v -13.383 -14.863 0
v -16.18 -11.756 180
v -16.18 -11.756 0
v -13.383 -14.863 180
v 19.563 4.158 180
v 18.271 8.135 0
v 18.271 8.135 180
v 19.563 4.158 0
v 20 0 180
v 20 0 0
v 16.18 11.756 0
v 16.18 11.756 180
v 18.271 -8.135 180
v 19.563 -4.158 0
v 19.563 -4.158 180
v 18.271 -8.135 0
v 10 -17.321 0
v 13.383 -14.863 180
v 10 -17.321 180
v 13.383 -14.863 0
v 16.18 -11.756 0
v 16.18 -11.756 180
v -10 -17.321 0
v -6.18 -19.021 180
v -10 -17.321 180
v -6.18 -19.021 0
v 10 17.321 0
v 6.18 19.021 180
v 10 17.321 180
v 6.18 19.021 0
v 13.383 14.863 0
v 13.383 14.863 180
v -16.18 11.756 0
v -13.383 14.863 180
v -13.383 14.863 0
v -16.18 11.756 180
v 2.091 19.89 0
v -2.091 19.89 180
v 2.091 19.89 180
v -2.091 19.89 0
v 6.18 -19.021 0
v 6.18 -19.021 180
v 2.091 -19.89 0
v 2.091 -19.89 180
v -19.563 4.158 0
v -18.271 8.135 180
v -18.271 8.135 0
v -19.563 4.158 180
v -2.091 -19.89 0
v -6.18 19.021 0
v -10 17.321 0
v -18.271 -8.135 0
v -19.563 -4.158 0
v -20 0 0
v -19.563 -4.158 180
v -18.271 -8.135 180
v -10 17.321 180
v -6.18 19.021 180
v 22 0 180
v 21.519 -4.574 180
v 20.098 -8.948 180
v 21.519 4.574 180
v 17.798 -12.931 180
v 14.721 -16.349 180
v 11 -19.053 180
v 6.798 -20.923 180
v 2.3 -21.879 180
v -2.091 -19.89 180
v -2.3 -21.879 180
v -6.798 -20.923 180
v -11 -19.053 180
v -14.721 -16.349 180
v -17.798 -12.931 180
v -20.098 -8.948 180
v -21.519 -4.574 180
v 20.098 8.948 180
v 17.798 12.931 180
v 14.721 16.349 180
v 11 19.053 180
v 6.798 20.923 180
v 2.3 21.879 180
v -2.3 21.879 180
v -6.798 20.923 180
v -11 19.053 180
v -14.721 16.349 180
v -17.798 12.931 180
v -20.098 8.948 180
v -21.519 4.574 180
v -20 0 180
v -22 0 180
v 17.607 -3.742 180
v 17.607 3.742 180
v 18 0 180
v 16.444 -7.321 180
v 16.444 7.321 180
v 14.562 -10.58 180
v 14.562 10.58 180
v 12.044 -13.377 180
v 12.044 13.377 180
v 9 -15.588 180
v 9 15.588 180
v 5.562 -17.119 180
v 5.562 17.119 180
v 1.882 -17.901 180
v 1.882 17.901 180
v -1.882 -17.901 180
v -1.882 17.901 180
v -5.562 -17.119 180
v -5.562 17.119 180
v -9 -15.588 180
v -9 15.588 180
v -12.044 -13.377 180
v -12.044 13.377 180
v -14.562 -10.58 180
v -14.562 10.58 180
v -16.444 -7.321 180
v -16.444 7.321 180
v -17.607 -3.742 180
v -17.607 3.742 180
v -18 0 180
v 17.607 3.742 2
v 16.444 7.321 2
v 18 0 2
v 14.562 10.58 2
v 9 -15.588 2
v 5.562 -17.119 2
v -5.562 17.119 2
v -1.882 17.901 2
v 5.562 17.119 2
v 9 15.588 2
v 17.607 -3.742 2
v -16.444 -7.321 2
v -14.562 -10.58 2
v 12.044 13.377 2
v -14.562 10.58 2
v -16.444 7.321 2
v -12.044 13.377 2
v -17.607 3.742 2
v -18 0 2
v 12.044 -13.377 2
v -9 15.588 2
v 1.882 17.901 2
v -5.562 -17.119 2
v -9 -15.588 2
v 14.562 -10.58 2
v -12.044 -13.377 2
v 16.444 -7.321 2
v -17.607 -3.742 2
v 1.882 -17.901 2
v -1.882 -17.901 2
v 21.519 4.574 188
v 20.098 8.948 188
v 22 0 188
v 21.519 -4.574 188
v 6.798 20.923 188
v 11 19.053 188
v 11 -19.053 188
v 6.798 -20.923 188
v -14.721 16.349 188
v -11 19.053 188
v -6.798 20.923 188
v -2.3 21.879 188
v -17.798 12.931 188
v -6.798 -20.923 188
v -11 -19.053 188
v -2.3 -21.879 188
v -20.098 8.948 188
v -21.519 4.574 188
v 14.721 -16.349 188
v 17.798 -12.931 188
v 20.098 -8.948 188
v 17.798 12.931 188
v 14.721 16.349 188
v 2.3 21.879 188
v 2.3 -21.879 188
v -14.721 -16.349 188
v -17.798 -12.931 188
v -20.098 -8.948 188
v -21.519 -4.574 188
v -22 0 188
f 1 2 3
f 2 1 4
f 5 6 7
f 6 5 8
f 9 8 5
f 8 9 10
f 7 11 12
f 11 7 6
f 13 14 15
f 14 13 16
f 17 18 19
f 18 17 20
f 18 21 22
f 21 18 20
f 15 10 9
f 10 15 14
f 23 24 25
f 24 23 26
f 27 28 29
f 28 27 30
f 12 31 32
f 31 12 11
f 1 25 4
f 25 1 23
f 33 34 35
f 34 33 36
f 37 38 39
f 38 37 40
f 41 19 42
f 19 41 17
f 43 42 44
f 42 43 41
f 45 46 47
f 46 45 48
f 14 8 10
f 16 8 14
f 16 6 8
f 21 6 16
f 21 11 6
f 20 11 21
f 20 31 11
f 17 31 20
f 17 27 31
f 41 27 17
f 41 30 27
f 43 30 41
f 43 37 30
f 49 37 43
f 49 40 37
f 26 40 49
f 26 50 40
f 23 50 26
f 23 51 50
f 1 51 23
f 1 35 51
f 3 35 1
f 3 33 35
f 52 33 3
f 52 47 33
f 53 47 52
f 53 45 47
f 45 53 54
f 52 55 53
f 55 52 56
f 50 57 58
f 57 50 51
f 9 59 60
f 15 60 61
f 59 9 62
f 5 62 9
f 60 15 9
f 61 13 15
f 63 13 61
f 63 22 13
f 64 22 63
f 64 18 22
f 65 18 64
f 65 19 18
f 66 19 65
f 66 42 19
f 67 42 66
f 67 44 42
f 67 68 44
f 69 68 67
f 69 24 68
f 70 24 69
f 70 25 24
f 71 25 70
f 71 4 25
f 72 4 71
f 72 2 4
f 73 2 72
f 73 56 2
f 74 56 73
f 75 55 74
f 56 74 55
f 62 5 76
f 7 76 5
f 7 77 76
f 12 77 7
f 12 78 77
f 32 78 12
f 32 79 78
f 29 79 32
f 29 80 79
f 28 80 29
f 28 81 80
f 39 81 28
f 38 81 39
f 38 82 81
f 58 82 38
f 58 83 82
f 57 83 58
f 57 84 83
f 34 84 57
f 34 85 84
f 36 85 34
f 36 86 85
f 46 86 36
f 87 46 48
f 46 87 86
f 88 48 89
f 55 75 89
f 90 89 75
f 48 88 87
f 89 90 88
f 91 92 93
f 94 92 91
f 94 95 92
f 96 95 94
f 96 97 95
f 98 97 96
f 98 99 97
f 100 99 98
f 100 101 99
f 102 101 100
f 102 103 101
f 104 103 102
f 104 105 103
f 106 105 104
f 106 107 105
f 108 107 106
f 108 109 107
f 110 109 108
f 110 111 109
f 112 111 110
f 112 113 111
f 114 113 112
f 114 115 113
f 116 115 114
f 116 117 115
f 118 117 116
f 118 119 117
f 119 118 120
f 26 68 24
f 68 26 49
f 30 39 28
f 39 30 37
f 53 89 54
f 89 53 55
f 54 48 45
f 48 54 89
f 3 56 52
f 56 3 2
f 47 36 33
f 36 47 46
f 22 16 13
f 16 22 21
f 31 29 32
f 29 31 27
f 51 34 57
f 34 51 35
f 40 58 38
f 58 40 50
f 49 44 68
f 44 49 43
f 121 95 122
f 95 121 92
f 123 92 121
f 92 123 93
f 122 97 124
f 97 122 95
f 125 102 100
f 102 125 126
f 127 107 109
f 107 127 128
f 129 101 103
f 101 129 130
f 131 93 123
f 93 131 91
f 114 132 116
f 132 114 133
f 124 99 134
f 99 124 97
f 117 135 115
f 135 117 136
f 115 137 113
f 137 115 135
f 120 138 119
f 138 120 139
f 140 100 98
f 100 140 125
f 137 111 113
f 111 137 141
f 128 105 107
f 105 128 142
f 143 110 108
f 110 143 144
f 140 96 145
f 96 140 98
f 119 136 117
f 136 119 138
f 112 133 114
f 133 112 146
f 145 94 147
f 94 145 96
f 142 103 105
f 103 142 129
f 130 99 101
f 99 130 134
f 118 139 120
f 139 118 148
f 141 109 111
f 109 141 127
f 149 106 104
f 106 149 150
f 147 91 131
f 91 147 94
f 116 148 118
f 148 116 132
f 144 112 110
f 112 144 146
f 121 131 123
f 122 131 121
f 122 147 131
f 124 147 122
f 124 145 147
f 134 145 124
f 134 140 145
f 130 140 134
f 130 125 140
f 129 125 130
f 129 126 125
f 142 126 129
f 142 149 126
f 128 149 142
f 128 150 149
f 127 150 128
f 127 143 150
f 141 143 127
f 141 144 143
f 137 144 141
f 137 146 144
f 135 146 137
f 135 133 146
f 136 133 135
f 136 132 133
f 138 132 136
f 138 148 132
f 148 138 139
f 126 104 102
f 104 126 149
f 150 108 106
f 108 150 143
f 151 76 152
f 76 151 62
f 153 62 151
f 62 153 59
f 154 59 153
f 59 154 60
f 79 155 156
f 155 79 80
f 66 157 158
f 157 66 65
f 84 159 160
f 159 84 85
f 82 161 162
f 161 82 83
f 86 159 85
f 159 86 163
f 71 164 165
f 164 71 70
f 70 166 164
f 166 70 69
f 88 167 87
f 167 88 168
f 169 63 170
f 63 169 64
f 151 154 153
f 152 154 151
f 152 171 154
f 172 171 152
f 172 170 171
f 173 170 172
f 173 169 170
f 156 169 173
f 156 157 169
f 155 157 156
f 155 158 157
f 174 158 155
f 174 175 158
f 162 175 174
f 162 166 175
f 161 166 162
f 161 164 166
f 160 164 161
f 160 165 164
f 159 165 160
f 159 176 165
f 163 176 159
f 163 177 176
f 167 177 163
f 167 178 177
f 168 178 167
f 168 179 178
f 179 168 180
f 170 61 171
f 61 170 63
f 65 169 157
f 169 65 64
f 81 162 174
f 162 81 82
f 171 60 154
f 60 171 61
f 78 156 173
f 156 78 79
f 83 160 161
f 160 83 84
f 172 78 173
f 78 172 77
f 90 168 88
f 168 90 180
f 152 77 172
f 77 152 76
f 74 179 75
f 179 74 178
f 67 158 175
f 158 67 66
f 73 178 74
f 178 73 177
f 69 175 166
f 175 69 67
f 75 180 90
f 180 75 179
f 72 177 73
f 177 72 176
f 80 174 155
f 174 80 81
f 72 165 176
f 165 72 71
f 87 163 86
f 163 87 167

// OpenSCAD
// file: ../lib/lib_jar.scad
// jar.scad

module jar_body(JAR_h, JAR_r, WALL=2) {
    difference() {
        cylinder(h = JAR_h, r = JAR_r);

        translate([0,0,WALL])
            cylinder(h = JAR_h, r = JAR_r - WALL);
    }
}

module jar_lid(JAR_h, JAR_r, LID_h=8, LID_extra=2) {
    translate([0,0,JAR_h])
        cylinder(h = LID_h, r = JAR_r + LID_extra);
}
// main file
include <../lib/lib_jar.scad>;

JAR_h = 180;
JAR_r = 20;

color("lightblue")
jar_body(JAR_h, JAR_r);

color("gray")
jar_lid(JAR_h, JAR_r);
